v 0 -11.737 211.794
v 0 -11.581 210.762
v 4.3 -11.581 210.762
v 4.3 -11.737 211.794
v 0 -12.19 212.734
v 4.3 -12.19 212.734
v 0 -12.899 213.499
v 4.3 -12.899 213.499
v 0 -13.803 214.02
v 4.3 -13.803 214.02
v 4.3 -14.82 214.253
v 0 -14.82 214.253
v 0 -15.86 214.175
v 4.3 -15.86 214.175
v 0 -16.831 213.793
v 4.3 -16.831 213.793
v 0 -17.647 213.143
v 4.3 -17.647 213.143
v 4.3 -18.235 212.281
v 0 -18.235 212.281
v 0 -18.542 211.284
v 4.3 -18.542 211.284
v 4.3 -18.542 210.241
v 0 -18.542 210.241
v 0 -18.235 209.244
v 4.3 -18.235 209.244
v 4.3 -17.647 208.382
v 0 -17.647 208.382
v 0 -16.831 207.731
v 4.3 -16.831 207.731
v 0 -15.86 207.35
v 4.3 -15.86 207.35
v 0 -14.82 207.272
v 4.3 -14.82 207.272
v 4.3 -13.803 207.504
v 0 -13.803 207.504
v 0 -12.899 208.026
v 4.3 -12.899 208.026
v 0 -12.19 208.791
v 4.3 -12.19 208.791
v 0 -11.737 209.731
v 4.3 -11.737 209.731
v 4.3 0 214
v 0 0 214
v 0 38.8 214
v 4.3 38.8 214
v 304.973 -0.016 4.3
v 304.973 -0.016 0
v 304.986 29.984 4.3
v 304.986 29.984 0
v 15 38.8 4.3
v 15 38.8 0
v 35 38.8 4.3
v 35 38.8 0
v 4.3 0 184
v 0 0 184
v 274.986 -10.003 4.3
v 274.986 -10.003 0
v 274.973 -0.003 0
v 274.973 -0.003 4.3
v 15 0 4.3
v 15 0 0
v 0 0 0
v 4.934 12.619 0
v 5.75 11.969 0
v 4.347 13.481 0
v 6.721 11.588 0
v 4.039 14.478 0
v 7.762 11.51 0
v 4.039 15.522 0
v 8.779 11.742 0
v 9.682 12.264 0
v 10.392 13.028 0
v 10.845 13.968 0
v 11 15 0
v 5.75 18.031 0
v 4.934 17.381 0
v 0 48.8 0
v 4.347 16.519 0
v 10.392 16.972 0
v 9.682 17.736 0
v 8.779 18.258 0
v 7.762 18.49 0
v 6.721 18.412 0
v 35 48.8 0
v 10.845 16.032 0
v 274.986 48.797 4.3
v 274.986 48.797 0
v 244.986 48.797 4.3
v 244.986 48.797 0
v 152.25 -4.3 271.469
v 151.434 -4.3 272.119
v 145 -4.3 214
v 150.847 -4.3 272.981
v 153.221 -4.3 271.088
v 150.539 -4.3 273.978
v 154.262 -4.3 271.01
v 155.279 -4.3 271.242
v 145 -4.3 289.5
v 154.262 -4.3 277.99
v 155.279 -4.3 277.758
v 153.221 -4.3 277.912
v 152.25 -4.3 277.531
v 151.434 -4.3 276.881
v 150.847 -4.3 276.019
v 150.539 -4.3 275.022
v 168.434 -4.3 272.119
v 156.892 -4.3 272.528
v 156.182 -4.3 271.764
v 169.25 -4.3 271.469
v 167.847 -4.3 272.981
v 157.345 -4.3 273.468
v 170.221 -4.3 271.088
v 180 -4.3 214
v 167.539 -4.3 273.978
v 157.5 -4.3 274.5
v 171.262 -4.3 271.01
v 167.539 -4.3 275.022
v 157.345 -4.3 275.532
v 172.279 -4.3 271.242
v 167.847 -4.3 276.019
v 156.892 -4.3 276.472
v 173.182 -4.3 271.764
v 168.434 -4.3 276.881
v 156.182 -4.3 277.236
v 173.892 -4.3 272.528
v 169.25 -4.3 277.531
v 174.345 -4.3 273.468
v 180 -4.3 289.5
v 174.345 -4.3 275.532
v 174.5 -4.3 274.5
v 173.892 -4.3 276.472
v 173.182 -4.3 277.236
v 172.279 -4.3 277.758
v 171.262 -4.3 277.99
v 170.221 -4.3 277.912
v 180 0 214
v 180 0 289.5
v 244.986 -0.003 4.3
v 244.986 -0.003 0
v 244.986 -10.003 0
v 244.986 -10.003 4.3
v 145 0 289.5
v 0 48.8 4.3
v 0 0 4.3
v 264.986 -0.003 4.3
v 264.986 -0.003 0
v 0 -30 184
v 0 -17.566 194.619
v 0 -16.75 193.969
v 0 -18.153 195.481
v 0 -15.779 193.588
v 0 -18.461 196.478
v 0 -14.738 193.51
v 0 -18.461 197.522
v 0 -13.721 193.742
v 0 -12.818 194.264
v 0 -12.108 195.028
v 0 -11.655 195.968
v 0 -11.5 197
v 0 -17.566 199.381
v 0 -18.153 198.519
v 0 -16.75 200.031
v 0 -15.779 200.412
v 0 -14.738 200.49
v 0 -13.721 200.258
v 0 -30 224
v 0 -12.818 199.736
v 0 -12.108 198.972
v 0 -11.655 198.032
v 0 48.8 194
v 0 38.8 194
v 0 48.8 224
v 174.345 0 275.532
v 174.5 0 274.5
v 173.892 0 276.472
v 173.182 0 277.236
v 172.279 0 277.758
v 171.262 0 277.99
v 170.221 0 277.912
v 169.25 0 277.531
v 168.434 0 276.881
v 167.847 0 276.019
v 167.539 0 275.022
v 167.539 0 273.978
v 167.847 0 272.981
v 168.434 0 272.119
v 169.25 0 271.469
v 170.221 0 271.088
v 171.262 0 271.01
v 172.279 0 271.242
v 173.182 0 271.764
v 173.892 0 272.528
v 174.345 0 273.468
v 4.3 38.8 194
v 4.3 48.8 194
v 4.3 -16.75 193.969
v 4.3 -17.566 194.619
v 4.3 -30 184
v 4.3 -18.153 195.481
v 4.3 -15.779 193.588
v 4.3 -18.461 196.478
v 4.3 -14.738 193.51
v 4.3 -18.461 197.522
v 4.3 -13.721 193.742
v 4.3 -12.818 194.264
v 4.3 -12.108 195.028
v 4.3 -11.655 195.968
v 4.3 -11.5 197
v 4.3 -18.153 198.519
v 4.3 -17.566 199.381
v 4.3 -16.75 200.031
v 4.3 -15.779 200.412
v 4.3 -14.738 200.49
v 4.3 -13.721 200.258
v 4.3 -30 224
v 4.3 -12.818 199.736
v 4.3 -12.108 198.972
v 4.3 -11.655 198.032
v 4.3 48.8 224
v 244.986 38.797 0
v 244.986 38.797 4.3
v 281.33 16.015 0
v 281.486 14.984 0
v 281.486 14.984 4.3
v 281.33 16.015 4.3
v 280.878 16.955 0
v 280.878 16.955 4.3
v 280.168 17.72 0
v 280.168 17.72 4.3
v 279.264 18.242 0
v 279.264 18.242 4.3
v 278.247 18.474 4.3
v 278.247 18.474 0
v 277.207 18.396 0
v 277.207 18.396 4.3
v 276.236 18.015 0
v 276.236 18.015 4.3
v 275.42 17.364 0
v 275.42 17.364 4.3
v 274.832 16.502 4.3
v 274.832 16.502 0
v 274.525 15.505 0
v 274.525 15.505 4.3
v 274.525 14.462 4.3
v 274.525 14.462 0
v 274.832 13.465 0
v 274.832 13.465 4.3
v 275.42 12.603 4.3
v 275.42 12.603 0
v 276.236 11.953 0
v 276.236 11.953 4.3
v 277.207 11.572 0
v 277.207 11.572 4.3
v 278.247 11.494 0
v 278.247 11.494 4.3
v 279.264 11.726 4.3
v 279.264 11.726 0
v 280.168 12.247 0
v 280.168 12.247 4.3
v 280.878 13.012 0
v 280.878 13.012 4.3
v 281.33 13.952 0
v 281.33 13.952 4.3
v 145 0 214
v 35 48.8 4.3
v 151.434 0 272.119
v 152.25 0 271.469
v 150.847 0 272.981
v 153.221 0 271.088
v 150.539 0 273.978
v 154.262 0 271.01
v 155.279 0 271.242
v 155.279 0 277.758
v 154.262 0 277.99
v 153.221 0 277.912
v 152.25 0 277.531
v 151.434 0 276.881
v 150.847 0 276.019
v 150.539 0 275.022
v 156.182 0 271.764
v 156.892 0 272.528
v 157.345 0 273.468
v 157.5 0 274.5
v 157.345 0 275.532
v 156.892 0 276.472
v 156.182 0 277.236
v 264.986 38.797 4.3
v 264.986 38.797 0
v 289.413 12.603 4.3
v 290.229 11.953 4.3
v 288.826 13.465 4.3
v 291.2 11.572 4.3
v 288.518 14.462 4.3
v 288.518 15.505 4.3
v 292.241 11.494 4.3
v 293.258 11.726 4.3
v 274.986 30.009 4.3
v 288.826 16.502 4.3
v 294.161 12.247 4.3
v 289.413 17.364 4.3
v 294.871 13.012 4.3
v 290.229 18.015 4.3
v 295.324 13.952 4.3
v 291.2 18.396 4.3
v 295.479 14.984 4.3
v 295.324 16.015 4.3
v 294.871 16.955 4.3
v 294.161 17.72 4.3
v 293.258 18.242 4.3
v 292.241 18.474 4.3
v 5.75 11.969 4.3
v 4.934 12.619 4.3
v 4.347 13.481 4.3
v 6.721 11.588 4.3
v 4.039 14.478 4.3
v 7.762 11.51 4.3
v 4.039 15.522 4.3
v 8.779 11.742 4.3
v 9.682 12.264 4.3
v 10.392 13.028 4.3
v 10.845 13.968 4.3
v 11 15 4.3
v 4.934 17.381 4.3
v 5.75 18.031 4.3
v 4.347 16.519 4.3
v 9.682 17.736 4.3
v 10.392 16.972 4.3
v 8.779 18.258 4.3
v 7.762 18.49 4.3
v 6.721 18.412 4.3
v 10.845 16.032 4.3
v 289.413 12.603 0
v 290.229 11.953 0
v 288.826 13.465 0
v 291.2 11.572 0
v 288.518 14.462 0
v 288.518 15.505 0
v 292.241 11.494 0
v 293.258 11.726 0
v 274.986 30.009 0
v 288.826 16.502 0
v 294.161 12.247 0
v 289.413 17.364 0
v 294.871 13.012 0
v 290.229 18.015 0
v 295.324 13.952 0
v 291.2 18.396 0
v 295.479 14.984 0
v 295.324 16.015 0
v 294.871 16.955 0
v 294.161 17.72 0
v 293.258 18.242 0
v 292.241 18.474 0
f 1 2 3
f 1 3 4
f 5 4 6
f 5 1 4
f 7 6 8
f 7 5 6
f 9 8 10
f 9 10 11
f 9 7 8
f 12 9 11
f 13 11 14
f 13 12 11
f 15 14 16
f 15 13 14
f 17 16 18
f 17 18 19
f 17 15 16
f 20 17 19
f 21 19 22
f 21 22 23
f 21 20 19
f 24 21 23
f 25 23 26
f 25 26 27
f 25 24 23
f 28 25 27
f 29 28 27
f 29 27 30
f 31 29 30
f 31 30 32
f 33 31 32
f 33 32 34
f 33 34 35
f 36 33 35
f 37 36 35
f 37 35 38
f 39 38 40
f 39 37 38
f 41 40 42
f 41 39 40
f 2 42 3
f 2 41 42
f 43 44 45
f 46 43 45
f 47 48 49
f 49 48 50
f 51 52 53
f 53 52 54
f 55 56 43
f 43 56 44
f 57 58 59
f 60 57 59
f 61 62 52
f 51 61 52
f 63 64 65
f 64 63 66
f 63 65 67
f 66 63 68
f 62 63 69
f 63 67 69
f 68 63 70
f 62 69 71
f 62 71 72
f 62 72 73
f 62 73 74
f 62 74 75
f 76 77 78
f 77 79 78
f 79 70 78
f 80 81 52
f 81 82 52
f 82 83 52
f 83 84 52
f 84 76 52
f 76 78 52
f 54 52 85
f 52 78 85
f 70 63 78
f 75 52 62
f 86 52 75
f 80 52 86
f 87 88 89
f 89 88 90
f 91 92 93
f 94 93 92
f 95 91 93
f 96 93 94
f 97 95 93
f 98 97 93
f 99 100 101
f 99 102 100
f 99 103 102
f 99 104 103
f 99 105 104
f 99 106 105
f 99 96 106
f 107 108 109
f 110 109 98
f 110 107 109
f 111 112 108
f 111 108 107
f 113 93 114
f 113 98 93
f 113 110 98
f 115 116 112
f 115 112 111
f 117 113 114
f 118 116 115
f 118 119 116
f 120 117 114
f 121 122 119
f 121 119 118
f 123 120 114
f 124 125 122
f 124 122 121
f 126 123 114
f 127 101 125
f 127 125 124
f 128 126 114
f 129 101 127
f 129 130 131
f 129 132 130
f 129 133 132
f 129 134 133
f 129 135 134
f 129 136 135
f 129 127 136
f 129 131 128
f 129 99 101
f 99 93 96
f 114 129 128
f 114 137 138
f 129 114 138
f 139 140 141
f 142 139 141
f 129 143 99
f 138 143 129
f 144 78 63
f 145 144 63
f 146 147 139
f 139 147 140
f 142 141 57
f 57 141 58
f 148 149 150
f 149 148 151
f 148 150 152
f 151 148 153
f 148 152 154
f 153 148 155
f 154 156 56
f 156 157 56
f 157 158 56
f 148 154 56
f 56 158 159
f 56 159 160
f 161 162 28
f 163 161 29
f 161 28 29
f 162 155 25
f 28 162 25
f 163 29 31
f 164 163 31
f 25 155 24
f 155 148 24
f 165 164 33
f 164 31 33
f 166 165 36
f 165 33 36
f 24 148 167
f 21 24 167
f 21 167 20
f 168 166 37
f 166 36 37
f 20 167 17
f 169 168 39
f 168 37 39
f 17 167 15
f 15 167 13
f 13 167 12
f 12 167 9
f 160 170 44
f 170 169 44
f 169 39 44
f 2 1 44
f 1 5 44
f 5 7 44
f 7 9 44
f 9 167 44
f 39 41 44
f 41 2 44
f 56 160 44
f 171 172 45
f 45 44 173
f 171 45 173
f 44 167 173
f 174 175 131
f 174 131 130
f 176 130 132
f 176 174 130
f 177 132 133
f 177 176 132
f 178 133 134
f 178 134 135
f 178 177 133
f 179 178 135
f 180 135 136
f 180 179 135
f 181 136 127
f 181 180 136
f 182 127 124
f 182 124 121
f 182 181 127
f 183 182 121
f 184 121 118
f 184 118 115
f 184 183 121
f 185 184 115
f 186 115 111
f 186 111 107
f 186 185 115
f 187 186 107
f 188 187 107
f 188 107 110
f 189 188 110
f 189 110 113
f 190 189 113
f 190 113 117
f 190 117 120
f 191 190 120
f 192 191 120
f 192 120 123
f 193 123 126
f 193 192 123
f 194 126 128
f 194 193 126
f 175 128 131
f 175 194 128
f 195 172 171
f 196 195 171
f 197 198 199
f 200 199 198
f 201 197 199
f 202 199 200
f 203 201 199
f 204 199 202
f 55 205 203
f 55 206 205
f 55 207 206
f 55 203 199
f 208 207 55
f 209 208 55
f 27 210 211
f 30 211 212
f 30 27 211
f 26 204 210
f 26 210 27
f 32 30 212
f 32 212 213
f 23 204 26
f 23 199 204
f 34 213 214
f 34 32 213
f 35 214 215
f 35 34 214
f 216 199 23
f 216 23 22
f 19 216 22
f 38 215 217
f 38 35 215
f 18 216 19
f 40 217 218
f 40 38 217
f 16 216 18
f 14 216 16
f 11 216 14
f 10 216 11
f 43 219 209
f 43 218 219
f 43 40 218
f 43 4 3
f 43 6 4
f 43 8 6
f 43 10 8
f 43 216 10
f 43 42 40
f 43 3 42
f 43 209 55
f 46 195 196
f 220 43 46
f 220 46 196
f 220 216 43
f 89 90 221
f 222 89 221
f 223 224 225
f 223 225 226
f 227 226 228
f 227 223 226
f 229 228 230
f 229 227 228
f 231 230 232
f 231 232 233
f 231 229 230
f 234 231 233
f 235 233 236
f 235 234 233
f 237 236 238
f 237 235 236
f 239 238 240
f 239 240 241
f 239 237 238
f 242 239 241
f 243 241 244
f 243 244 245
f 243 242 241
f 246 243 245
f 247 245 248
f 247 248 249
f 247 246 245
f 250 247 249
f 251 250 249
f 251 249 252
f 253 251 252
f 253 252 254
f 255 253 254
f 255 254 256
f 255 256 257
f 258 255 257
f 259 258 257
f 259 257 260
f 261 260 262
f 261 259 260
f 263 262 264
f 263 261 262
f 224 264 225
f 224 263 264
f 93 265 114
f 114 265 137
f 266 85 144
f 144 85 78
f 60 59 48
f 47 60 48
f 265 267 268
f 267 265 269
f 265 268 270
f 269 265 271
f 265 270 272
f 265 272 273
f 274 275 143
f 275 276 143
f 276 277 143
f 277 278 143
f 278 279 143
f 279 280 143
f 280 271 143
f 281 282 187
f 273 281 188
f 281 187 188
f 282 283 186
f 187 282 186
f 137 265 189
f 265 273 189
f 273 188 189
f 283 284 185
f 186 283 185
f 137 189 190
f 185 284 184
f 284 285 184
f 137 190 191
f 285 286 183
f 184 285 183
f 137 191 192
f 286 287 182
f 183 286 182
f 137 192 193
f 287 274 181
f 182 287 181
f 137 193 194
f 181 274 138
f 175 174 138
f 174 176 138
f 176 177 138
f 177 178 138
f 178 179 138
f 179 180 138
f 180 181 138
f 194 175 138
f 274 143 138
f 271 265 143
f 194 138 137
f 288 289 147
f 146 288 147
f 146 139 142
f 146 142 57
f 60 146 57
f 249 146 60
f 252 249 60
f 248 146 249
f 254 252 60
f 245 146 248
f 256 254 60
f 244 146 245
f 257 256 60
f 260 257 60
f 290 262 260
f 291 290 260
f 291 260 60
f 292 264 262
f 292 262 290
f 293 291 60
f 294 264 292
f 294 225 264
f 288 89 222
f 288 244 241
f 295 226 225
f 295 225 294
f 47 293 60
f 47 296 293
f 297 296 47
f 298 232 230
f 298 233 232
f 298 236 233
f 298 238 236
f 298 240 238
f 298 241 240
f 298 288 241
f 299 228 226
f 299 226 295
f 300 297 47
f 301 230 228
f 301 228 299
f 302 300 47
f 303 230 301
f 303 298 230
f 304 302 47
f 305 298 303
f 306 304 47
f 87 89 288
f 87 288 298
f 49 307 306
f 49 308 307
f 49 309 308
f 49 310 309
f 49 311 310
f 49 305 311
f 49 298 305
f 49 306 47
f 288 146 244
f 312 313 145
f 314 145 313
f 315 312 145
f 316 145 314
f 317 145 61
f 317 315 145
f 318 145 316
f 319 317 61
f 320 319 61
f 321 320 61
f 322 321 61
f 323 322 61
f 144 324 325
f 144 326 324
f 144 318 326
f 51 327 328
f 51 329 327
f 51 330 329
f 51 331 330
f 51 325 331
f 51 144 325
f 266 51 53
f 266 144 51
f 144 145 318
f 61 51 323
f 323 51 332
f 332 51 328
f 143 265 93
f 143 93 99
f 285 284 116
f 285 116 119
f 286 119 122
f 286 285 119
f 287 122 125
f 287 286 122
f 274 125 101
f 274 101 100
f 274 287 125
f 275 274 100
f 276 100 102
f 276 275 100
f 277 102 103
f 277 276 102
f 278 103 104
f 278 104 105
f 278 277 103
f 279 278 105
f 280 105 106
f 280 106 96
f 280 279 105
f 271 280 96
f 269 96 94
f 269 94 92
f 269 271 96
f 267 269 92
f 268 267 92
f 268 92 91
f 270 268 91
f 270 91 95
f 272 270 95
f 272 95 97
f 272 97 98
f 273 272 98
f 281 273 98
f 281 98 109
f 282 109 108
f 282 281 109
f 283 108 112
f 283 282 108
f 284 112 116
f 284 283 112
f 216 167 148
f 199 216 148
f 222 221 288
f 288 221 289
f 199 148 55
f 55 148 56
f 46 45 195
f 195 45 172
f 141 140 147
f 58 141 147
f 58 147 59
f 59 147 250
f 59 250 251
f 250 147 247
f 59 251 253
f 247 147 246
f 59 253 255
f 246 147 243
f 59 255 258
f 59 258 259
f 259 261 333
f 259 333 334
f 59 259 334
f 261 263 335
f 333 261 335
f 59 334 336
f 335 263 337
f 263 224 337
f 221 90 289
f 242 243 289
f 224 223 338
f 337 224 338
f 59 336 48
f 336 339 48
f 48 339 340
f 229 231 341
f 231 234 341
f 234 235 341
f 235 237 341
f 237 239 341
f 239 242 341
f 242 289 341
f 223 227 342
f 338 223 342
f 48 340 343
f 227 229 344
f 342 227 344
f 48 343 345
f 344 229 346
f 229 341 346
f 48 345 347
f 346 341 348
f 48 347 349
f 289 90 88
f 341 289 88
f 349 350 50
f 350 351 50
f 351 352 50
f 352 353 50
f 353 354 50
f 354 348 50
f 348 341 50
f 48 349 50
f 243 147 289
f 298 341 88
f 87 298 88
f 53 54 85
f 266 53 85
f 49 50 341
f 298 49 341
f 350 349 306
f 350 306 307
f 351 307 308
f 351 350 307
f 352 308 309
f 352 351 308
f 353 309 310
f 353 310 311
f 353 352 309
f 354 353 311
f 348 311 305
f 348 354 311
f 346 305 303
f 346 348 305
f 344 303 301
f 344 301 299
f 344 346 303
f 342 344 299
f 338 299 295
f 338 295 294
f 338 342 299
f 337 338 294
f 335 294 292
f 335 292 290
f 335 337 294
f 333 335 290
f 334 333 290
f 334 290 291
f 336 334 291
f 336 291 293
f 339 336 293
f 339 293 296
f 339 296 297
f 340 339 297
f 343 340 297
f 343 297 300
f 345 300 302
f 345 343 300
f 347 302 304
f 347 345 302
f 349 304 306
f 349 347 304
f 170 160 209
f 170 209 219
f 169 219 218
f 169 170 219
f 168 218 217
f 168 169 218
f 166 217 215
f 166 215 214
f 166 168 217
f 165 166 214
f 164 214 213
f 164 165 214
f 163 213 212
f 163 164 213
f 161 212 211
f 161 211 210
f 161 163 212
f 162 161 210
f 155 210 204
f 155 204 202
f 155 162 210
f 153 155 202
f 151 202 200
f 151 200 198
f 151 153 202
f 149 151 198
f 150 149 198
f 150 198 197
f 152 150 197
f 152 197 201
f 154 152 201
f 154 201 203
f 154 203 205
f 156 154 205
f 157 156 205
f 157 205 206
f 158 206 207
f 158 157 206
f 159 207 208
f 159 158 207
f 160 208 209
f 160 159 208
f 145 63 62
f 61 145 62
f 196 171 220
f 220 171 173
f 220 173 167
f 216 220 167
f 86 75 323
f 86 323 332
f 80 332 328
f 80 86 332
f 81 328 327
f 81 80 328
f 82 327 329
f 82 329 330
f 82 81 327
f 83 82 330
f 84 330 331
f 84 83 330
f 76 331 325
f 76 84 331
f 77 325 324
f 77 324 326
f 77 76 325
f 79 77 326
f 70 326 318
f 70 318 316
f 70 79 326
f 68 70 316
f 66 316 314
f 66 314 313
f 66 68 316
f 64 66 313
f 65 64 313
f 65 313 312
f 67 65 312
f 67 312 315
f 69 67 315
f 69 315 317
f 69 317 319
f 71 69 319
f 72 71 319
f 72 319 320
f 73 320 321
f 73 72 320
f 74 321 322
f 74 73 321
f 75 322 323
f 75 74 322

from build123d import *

# Parameters (mm, degrees)
F0_R     = 3.5
F1_DEPTH = 4.3
F2_R     = 3.5
F3_DEPTH = 4.3
F4_W     = 35
F4_H     = 75.5
F4_R     = 3.5
F5_DEPTH = 4.3


with BuildPart() as f1:
    # F0 (on Top) → F1 (new body)
    with BuildSketch(Plane.XY):
        Polygon((15, 38.8), (35, 38.8), (35, 48.8), (0, 48.8), (0, 0), (15, 0), align=None)
        with Locations((7.5, 15)):
            Circle(F0_R, mode=Mode.SUBTRACT)
        Polygon((264.985677, 38.796831), (264.985677, -0.003169), (244.985677, -0.003169), (244.985677, -10.003169), (274.985677, -10.003169), (274.97262, -0.003169), (304.972617, -0.016218), (304.985666, 29.983779), (274.985677, 30.009437), (274.985677, 48.796831), (244.985677, 48.796831), (244.985677, 38.796831), align=None)
        with Locations((277.985677, 14.98378)):
            Circle(F0_R, mode=Mode.SUBTRACT)
        with Locations((291.979141, 14.98378)):
            Circle(F0_R, mode=Mode.SUBTRACT)
    extrude(amount=F1_DEPTH)


with BuildPart() as f3:
    # F2 (on Right) → F3 (new body)
    with BuildSketch(Plane.YZ):
        Polygon((-30, 184), (0, 184), (0, 214), (38.8, 214), (38.8, 194), (48.8, 194), (48.8, 224), (-30, 224), align=None)
        with Locations((-15, 197)):
            Circle(F2_R, mode=Mode.SUBTRACT)
        with Locations((-15.081362, 210.762352)):
            Circle(F2_R, mode=Mode.SUBTRACT)
    extrude(amount=F3_DEPTH)


with BuildPart() as f5:
    # F4 (on Front) → F5 (new body)
    with BuildSketch(Plane.XZ):
        with Locations((162.5, 251.75)):
            Rectangle(F4_W, F4_H)
        with Locations((154, 274.5)):
            Circle(F4_R, mode=Mode.SUBTRACT)
        with Locations((171, 274.5)):
            Circle(F4_R, mode=Mode.SUBTRACT)
    extrude(amount=F5_DEPTH)


solid = Compound([f1.part, f3.part, f5.part])
